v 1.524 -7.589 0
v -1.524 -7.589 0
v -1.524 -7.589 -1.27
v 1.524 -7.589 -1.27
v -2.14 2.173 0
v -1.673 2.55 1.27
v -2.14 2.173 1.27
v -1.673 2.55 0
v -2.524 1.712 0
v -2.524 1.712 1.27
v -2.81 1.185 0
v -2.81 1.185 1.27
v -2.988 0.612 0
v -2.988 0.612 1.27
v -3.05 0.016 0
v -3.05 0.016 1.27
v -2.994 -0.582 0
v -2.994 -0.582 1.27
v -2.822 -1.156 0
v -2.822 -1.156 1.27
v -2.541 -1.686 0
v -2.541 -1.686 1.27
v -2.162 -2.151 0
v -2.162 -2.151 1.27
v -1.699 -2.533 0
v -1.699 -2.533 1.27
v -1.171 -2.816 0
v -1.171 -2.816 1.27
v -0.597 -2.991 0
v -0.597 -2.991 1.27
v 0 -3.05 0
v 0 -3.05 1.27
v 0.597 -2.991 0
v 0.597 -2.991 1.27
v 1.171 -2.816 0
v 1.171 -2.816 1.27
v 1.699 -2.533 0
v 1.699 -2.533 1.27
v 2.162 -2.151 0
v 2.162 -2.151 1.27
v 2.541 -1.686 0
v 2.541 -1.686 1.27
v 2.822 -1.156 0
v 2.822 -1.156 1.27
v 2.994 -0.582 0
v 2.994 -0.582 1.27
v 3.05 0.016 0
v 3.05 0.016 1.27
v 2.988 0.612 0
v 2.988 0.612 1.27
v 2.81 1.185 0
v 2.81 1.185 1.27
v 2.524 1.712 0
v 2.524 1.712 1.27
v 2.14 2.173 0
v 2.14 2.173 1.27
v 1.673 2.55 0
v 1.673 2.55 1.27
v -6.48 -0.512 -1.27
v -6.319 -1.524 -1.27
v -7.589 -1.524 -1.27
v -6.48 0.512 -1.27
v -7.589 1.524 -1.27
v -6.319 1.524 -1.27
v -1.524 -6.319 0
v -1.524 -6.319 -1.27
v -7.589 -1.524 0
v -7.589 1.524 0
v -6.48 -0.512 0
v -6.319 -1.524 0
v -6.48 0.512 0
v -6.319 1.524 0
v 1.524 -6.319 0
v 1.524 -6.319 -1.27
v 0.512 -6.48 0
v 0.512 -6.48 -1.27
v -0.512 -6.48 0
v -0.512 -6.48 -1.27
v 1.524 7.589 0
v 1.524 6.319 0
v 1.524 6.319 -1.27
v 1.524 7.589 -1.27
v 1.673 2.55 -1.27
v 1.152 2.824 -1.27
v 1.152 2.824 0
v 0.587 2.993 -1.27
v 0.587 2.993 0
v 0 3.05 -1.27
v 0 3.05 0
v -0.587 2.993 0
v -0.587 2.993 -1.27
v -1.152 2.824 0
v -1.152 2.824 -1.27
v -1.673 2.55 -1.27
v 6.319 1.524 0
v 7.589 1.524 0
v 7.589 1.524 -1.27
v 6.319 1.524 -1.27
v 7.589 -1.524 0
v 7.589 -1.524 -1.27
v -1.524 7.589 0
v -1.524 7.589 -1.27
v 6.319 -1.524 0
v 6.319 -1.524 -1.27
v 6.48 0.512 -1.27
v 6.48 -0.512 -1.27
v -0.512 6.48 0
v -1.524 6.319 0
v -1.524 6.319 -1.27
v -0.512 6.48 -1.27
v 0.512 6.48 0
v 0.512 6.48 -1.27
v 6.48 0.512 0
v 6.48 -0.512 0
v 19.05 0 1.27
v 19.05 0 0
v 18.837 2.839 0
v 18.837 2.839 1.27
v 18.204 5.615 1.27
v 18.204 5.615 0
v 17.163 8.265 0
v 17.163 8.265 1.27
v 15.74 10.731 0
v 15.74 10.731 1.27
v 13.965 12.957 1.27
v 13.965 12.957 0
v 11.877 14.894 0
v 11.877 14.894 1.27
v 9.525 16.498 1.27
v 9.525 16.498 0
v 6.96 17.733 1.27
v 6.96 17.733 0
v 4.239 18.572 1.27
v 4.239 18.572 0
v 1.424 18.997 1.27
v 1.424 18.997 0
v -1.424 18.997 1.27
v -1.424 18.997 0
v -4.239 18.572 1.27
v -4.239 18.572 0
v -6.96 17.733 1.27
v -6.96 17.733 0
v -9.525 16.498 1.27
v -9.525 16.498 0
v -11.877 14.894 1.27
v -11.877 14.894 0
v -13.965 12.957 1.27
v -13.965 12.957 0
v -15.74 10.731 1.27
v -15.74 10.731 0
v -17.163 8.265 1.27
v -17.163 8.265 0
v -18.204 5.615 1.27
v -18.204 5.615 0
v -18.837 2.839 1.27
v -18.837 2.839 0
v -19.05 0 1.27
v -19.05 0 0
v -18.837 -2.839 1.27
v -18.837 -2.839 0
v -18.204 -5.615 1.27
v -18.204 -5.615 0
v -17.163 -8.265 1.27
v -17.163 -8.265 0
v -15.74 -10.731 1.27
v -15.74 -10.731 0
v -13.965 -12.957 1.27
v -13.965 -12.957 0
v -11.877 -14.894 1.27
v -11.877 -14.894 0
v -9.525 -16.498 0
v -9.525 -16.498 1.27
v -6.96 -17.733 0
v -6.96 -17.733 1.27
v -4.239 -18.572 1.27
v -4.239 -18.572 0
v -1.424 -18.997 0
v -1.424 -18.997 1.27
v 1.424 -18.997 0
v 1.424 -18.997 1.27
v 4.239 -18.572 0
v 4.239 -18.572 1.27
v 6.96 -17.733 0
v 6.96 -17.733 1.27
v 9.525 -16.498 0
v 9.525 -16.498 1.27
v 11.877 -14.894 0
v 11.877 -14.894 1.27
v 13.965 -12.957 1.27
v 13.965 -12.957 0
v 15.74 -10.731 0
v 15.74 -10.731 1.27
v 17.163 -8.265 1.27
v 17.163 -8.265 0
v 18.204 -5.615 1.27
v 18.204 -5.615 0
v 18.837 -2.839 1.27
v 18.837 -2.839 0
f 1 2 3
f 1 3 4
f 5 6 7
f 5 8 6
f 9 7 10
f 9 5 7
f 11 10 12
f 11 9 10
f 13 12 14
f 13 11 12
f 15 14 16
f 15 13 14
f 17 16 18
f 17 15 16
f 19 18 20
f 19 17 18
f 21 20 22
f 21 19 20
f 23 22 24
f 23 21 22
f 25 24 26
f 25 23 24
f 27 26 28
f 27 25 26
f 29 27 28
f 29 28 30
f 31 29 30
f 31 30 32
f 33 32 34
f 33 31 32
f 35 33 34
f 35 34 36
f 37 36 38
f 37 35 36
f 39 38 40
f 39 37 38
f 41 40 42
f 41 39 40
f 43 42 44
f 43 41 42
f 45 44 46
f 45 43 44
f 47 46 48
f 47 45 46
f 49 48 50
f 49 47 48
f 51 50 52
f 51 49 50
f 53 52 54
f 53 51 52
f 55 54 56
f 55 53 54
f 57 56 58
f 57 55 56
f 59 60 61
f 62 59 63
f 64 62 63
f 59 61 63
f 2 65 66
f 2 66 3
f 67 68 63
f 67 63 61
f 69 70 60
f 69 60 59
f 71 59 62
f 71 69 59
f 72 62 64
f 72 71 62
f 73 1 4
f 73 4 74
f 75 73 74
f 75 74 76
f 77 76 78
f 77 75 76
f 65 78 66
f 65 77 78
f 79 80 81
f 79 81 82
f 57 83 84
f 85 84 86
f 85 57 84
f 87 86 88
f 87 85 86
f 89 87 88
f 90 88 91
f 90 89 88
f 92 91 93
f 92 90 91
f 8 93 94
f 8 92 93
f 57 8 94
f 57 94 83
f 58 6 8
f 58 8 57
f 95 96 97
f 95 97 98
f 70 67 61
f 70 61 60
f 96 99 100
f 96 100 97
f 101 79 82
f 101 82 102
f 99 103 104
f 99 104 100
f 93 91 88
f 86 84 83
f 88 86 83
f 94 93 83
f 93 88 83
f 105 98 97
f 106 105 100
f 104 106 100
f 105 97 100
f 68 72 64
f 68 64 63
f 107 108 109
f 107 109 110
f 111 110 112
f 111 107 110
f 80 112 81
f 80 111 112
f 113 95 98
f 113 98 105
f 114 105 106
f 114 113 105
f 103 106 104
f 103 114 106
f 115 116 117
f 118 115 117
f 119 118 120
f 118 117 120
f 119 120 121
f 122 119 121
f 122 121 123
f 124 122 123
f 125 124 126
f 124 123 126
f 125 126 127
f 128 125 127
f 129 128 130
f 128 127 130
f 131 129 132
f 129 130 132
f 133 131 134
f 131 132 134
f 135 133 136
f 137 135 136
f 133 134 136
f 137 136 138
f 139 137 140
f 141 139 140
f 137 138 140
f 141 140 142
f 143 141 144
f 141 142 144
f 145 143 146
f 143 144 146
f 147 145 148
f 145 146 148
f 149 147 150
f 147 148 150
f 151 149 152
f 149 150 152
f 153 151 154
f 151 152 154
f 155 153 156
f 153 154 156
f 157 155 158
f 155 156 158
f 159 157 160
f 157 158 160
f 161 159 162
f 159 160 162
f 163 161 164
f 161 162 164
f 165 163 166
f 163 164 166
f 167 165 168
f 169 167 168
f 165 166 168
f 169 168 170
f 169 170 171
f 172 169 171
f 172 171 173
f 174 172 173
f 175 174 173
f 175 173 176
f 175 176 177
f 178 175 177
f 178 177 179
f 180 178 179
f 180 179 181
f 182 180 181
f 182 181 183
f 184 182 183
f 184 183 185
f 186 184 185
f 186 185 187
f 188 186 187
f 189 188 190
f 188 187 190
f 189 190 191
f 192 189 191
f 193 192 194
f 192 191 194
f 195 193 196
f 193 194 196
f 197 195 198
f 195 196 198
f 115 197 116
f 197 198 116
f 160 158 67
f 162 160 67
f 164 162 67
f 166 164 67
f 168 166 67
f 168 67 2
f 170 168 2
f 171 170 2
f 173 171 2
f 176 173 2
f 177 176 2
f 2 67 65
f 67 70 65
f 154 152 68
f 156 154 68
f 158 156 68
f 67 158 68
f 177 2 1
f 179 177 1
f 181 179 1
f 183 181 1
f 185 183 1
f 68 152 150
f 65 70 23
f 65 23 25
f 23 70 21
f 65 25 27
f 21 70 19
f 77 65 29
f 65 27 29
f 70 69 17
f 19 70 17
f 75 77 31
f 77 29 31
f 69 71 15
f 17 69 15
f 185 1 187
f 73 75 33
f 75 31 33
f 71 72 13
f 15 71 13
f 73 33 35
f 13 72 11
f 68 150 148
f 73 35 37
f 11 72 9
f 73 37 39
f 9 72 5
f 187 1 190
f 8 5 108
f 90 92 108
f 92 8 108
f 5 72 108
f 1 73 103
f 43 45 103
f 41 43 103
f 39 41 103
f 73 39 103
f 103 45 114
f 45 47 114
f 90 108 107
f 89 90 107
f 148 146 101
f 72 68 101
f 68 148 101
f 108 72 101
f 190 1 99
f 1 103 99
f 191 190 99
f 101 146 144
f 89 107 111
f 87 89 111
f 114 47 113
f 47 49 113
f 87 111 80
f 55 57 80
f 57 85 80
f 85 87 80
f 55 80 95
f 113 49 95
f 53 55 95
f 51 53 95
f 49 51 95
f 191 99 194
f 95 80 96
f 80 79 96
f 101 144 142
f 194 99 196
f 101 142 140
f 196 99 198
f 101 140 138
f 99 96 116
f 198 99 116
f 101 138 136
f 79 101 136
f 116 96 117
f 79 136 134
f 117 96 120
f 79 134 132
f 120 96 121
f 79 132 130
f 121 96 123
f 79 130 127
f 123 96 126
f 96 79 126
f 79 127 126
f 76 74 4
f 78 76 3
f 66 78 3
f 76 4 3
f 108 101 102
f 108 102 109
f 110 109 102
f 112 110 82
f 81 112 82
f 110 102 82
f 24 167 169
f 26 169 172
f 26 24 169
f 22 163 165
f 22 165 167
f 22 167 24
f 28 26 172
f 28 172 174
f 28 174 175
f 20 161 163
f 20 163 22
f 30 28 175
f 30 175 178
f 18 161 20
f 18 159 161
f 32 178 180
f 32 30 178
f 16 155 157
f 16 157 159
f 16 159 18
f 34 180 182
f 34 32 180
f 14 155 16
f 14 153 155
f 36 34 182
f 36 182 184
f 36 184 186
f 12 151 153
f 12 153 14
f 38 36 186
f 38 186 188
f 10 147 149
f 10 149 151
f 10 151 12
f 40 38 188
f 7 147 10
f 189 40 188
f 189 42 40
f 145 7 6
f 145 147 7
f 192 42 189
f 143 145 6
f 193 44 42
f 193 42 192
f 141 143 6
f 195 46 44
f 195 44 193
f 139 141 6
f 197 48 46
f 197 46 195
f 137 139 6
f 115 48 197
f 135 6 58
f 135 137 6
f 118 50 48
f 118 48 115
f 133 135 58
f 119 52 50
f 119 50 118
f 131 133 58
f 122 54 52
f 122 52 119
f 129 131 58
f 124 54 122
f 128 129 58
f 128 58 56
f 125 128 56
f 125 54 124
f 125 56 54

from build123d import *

# Parameters (mm, degrees)
SKETCH1_R           = 19.05
SKETCH1_R_2         = 3.05
BOSS_EXTRUDE1_DEPTH = 1.27
BOSS_EXTRUDE2_DEPTH = 1.27
CIRPATTERN1_COUNT   = 4
BOSS_EXTRUDE3_DEPTH = 2.54


with BuildPart() as part:
    # Sketch1 → Boss-Extrude1 (new body)
    with BuildSketch(Plane.XY):
        Circle(SKETCH1_R)
        Circle(SKETCH1_R_2, mode=Mode.SUBTRACT)
    extrude(amount=BOSS_EXTRUDE1_DEPTH)

    # Sketch2 → Boss-Extrude2 (add)
    with BuildSketch(Plane(origin=(0, 0, 0), x_dir=(-1, 0, 0), z_dir=(0, 0, -1))):
        with BuildLine():
            Line((-1.524, 6.318815031), (-1.524, 7.588815031))
            Line((-1.524, 7.588815031), (1.524, 7.588815031))
            Line((1.524, 7.588815031), (1.524, 6.318815031))
            ThreePointArc((1.524, 6.318815031), (0, 6.499999954), (-1.524, 6.318815031))
        make_face()
    boss_extrude2 = extrude(amount=BOSS_EXTRUDE2_DEPTH)

    # CirPattern1: Boss-Extrude2 ×4 about axis
    cirpattern1_axis = Axis((0, 0, 0), (0, 0, 1))
    for i in range(1, CIRPATTERN1_COUNT):
        add(boss_extrude2.rotate(cirpattern1_axis, i * 360 / CIRPATTERN1_COUNT))

    # Sketch3 → Boss-Extrude3 (add, through all)
    with BuildSketch(Plane.XY.offset(1.27)):
        with BuildLine():
            Line((-1.673320053, 2.55), (1.673320053, 2.55))
            ThreePointArc((1.673320053, 2.55), (0, 3.05), (-1.673320053, 2.55))
        make_face()
    extrude(amount=-BOSS_EXTRUDE3_DEPTH)


solid = part.part
